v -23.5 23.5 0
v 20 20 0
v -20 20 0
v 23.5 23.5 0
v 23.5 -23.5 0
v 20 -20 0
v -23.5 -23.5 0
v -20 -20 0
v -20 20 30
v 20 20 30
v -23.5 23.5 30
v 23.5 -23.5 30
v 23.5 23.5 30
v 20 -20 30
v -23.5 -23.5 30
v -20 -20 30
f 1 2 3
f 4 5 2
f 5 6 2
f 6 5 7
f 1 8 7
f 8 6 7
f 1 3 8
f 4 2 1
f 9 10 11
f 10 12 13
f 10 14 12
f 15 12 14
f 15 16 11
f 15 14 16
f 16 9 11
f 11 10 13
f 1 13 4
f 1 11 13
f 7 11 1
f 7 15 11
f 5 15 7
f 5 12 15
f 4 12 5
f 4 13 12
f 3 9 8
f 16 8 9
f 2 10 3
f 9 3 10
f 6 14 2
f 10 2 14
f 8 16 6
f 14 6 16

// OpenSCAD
// Generated by SolidPython 0.4.7 on 2020-04-10 19:30:12


linear_extrude(height = 30) {
	difference() {
		square(center = true, size = 47);
		square(center = true, size = 40);
	}
}
/***********************************************
*********      SolidPython code:      **********
************************************************
 
from .lib.grinder_base import GrinderBase
from .lib.dell_connector import DellConnector
from .lib.holder.round_holder import RoundHolder

from solid import *
from solid.utils import *  # Not required, but the utils module is useful





#connector = DellConnector(x_holders=4, y_holders=2)

#scad = connector.rotate_to_print(connector.multiple_dell_holder())
#scad = connector.multiple_dell_holder()



#top = GrinderBase.custom_diameter(90, 17).platform()
#scad_render_to_file(top, "coffee-grinder_base.scad")


base = GrinderBase().platform()
scad_render_to_file(base, "coffee-grinder_base.scad")


round_holder = RoundHolder().completeHolder()
scad_render_to_file(round_holder, "coffee-round-holder.scad")

connector = linear_extrude(height=30)(square(47, center=True)-square(40, center=True))
scad_render_to_file(connector, "coffee-connector.scad")
 
 
************************************************/
